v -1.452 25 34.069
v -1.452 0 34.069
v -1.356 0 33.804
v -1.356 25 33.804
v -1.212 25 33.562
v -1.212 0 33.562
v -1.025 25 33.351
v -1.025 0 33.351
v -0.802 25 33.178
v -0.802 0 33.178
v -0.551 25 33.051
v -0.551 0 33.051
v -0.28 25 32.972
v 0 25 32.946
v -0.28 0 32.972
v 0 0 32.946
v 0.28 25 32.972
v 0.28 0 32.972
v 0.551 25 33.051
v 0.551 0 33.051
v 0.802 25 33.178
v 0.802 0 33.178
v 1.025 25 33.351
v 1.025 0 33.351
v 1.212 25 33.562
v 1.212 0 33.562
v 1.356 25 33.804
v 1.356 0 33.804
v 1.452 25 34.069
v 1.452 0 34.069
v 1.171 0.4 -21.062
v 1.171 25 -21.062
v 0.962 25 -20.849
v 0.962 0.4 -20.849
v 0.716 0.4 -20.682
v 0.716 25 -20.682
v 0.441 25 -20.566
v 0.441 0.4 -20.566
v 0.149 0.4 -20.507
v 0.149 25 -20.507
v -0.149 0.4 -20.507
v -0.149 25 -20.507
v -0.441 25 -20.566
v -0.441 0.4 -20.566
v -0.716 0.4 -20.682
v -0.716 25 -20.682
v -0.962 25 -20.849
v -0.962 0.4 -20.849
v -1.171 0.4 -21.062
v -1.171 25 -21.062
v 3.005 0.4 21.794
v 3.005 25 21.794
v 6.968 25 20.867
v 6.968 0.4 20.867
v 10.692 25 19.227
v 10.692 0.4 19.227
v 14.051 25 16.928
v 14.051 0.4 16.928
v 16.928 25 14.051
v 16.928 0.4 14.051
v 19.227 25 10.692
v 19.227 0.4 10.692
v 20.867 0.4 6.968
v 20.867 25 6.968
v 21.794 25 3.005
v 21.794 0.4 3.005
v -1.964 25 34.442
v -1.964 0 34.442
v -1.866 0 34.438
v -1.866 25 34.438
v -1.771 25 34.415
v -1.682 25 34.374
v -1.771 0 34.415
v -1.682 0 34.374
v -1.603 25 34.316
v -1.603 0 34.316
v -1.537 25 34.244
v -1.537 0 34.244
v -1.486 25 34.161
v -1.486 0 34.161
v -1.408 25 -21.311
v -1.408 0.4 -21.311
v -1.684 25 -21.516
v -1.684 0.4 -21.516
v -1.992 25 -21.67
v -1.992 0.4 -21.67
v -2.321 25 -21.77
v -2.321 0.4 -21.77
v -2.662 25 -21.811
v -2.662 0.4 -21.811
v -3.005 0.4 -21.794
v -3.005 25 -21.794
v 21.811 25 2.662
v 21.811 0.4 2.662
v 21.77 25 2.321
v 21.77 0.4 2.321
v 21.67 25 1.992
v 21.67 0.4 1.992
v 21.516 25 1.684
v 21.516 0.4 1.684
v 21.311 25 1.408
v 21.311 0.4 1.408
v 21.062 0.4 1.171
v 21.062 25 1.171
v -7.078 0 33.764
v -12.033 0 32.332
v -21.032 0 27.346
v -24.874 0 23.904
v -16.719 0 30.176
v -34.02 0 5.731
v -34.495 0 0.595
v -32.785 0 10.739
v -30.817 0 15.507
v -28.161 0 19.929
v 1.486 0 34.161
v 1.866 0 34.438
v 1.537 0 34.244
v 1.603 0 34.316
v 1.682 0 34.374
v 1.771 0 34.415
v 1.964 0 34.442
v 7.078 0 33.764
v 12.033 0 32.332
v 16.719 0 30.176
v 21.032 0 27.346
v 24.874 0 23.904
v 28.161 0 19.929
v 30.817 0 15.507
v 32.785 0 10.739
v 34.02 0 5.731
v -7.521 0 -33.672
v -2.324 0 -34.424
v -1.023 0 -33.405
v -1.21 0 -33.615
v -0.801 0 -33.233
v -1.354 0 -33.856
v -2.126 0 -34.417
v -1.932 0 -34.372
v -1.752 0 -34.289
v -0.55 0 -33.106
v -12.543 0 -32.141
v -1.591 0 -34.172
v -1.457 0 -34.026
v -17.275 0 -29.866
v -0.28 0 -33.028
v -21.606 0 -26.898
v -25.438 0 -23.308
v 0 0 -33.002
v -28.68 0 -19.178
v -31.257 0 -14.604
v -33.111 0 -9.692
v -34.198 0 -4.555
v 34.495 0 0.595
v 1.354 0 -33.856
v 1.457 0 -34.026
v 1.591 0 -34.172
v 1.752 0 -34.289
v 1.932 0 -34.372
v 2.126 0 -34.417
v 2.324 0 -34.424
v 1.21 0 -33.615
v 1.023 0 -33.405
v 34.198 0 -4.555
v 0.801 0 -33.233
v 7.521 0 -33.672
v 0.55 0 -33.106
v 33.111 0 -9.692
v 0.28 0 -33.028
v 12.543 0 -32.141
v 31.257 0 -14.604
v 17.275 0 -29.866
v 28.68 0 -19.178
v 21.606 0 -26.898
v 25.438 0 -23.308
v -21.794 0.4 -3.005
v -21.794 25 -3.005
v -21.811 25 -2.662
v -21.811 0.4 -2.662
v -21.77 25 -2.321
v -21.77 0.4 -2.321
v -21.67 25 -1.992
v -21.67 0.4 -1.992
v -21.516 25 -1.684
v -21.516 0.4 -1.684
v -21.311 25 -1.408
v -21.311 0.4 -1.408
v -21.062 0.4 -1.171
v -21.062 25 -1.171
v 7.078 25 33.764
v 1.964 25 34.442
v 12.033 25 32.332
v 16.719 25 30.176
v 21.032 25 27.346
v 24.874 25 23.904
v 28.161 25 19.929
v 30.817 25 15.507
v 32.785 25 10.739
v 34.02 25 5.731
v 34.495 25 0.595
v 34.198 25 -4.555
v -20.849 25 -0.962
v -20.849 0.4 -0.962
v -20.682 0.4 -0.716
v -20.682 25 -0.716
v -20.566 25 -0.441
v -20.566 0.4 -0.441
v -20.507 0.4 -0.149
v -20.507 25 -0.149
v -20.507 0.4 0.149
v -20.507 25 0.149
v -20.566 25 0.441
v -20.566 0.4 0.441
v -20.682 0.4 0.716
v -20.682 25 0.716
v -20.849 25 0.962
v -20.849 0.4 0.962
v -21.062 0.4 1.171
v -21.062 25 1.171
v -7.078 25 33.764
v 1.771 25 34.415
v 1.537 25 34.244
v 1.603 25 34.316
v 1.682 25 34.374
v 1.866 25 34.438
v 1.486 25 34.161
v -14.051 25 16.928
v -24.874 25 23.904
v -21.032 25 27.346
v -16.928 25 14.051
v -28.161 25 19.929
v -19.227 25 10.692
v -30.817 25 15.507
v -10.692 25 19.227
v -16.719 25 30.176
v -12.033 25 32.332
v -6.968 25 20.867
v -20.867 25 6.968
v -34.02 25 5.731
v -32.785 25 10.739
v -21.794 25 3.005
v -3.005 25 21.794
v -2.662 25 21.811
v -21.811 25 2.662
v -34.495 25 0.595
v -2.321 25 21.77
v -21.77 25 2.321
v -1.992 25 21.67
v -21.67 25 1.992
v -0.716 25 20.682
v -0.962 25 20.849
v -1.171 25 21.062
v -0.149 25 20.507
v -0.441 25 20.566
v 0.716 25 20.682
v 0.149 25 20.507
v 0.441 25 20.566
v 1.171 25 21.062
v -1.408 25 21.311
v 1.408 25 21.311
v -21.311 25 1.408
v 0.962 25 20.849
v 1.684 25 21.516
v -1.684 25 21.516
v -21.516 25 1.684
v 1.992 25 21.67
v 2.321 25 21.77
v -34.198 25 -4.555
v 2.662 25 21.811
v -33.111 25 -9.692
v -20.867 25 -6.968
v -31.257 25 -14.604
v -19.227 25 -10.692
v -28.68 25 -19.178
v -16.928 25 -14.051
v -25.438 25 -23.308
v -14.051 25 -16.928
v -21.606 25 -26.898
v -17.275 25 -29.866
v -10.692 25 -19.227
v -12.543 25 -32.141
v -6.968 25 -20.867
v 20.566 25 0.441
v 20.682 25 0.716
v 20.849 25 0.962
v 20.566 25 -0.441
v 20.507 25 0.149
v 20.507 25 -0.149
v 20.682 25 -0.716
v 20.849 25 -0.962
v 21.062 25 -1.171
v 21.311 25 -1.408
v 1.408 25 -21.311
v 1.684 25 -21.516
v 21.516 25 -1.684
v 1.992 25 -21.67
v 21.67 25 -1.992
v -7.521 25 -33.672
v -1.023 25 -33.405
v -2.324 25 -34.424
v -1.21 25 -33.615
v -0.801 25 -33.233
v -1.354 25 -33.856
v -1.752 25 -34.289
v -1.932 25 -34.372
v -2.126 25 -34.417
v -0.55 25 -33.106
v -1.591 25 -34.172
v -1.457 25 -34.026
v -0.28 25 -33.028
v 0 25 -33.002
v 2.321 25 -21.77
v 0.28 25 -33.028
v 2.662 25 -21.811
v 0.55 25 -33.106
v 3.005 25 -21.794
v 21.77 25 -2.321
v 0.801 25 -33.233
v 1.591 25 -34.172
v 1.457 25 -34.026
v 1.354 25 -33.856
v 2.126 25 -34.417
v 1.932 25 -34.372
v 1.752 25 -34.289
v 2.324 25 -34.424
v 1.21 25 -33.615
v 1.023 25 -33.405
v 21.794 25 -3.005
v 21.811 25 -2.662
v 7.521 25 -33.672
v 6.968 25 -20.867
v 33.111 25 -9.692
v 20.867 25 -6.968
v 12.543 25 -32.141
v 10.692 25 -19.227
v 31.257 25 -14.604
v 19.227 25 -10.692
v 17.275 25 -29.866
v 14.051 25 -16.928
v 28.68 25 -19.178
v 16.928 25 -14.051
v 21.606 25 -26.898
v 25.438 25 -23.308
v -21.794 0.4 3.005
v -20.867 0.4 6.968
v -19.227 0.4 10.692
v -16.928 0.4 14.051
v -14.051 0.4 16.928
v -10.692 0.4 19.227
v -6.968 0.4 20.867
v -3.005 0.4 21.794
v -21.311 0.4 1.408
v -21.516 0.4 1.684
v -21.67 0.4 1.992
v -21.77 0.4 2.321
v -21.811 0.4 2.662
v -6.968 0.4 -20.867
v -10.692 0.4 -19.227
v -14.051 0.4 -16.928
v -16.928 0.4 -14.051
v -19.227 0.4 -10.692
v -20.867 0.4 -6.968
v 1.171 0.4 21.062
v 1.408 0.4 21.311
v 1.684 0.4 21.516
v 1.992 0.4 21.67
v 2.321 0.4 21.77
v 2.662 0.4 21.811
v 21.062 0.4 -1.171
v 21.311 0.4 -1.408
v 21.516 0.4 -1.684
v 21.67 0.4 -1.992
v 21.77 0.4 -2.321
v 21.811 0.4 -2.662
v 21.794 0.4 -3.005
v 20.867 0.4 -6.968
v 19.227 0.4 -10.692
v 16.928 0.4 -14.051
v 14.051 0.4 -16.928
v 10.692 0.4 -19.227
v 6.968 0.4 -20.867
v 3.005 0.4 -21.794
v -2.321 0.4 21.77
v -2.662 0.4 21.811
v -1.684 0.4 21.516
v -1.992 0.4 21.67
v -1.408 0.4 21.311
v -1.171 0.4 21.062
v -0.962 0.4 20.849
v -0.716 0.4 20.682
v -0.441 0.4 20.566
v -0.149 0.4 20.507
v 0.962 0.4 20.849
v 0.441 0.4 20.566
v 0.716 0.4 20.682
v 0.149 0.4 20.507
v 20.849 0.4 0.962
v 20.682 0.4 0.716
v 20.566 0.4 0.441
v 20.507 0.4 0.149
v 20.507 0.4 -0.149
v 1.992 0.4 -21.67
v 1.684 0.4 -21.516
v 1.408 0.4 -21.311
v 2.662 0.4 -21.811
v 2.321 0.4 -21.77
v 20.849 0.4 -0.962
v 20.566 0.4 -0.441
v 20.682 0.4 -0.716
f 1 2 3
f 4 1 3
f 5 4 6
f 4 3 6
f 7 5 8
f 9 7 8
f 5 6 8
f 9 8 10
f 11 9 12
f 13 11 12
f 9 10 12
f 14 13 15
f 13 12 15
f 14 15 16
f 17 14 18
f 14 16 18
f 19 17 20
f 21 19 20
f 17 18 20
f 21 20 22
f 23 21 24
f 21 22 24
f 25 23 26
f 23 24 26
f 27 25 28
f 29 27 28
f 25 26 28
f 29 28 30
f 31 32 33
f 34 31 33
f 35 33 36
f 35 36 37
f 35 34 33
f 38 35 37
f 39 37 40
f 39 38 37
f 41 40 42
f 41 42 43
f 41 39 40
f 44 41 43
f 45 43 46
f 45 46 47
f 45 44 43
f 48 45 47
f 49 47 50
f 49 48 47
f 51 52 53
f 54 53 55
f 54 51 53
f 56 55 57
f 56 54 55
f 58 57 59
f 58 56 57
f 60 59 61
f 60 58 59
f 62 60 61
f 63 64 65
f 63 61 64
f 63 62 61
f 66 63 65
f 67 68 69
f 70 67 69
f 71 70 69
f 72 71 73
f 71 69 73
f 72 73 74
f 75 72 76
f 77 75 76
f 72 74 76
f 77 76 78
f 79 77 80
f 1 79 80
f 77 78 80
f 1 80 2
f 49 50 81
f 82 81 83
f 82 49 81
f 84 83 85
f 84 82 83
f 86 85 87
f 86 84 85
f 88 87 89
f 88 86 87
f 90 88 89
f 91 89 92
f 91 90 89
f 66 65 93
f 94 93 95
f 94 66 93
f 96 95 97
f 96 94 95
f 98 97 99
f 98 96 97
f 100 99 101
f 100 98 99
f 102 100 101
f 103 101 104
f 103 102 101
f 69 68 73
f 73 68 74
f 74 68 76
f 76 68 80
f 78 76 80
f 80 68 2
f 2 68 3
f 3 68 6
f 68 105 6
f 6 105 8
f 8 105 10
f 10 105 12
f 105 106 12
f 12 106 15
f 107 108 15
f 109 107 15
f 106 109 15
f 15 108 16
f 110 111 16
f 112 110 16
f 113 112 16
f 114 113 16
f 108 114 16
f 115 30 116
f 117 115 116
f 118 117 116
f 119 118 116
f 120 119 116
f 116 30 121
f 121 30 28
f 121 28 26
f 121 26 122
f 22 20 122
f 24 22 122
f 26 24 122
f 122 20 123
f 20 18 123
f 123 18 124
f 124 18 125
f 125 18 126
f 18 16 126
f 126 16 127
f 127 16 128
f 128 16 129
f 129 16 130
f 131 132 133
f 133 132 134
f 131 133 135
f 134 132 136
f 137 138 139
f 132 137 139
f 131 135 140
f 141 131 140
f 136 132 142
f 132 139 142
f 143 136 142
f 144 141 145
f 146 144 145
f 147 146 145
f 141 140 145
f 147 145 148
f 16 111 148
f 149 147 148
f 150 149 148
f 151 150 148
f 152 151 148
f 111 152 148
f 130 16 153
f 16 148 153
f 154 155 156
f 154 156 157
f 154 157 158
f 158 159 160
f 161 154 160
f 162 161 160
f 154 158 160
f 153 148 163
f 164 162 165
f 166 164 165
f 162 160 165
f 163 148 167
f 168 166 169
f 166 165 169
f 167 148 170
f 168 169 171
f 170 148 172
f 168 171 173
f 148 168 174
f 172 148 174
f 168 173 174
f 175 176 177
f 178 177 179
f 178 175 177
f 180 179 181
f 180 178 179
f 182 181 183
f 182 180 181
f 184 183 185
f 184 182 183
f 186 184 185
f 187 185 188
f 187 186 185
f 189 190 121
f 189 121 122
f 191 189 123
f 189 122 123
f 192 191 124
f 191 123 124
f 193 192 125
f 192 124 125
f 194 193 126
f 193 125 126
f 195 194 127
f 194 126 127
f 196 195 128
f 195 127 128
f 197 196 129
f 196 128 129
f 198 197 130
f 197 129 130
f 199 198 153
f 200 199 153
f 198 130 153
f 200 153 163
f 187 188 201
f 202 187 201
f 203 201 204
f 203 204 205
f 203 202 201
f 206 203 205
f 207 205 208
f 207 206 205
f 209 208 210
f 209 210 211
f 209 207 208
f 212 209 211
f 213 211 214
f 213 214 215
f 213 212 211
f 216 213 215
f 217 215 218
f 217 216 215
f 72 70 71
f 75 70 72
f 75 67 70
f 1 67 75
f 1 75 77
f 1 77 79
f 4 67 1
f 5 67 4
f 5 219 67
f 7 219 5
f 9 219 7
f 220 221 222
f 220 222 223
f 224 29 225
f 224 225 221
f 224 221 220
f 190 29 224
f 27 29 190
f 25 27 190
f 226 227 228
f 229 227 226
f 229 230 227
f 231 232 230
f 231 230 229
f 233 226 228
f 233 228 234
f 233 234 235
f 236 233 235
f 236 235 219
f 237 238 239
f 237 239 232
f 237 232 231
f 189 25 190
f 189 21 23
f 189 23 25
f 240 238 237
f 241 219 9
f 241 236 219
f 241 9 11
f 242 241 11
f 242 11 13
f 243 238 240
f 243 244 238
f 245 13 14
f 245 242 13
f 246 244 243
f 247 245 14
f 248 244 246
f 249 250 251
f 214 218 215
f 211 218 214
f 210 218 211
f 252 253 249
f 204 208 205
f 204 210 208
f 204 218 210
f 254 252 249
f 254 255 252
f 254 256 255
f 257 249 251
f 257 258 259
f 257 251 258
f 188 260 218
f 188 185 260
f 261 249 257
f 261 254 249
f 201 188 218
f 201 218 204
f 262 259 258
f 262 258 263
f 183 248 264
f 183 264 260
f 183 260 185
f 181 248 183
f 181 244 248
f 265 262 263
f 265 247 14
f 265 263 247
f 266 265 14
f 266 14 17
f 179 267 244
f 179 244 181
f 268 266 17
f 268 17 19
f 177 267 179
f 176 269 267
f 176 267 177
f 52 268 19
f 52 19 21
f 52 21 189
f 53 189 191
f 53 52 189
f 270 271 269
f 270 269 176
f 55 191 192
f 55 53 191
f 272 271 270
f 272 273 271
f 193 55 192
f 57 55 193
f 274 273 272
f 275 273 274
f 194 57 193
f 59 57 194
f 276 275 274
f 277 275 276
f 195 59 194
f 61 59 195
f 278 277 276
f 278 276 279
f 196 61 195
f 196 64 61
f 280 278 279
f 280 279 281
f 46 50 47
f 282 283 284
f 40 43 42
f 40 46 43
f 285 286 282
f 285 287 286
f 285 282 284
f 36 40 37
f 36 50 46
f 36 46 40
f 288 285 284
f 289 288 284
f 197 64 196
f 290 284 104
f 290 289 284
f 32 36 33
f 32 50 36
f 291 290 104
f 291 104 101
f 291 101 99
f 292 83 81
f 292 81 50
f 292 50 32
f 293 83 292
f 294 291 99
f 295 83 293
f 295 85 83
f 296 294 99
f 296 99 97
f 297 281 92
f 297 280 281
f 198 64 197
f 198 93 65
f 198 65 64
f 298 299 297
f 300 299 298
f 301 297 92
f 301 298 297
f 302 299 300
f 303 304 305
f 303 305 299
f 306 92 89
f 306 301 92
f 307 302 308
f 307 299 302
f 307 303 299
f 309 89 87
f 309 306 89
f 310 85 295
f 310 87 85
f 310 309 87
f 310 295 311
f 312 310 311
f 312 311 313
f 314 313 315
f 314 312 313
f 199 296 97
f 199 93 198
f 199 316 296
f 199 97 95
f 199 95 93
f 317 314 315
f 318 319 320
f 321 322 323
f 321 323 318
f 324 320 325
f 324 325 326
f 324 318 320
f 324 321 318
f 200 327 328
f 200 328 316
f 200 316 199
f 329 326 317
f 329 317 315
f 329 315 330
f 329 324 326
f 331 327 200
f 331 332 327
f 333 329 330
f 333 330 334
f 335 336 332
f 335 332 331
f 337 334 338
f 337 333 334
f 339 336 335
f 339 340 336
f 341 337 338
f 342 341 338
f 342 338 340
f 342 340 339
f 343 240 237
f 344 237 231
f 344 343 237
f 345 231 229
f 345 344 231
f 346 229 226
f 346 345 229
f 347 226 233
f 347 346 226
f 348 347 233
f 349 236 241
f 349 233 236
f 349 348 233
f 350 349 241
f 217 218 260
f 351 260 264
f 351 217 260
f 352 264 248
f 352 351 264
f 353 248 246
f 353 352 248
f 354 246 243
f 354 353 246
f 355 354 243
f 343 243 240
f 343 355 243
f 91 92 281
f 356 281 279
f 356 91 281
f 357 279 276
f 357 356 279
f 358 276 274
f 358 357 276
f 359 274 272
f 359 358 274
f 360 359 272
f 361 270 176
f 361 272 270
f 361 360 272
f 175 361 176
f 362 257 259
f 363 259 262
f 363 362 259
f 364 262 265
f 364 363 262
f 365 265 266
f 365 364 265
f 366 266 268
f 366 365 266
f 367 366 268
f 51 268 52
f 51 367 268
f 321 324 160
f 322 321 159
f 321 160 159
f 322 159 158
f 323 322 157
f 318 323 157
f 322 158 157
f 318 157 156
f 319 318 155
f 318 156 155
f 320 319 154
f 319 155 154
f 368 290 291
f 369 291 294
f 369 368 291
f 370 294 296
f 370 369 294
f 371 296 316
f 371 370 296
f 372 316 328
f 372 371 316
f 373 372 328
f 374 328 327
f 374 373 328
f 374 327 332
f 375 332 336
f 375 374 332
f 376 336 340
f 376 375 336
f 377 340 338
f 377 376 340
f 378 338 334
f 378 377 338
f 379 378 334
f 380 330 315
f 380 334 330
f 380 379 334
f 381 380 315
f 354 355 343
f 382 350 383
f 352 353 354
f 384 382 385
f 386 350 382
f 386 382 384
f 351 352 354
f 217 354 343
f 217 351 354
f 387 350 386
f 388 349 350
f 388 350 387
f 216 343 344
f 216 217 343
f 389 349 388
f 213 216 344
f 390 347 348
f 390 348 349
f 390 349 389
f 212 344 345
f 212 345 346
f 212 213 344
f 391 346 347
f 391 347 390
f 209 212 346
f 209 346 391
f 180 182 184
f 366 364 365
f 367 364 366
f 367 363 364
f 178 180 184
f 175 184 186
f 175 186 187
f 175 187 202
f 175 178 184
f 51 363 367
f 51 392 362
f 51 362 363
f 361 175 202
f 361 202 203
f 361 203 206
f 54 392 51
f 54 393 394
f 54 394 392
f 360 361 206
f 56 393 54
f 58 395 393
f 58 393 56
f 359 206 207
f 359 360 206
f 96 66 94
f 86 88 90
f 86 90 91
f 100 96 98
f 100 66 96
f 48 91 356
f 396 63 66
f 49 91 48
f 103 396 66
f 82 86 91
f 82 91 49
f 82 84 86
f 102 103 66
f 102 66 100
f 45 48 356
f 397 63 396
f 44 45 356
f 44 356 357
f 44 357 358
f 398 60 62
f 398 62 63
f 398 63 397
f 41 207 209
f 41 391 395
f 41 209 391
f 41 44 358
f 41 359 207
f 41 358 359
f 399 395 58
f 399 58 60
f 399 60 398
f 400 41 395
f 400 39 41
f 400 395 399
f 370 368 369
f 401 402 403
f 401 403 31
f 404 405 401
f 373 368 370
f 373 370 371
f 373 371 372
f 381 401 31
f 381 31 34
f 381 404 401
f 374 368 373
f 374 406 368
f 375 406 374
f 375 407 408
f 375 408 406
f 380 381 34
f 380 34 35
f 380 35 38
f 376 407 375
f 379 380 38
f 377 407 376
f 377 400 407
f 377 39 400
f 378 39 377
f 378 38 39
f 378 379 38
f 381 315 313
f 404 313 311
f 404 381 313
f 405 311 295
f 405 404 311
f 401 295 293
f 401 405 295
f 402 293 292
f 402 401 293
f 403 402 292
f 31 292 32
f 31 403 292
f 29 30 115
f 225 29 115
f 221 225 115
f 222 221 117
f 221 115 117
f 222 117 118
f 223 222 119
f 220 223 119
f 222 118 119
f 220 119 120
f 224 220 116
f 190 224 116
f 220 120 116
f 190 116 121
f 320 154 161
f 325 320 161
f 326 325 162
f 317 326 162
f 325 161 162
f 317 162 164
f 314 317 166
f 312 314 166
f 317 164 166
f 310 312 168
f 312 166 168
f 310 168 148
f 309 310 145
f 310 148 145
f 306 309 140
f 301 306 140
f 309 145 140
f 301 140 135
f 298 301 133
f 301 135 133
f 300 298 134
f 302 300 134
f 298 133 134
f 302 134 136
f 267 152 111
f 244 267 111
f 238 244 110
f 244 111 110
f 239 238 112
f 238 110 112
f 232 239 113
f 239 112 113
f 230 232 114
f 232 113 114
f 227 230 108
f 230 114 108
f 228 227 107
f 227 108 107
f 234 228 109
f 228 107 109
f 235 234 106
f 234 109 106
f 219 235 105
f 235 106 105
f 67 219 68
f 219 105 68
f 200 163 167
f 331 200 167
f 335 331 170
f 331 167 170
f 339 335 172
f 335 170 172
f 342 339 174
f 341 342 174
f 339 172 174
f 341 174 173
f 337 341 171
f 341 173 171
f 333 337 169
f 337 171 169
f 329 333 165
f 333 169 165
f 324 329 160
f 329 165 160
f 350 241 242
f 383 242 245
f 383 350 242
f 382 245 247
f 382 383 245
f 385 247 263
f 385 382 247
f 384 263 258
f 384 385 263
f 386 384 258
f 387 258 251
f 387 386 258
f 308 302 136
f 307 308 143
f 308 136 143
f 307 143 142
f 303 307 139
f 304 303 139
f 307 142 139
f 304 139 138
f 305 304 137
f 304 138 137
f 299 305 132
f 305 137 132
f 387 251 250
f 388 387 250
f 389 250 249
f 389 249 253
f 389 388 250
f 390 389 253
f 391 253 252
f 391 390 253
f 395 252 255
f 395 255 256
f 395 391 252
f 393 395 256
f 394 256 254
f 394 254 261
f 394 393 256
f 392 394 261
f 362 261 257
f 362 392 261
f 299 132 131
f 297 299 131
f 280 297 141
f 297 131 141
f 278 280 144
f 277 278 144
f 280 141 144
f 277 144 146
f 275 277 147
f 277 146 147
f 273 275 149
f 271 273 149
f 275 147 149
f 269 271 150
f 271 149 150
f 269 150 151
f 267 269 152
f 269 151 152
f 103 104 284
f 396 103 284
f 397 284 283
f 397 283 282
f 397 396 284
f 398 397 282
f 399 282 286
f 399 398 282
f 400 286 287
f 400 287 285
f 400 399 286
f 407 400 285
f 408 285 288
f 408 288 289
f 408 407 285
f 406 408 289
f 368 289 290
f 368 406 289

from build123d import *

# Parameters (mm, degrees)
BOSS_EXTRUDE1_DEPTH = 25
CUT_EXTRUDE2_DEPTH  = 26
BOSS_EXTRUDE2_DEPTH = 0.4


with BuildPart() as part:
    # Sketch1 → Boss-Extrude1 (new body)
    with BuildSketch(Plane(origin=(0, 0, 0), x_dir=(1, 0, 0), z_dir=(0, 1, 0))):
        with BuildLine():
            ThreePointArc((1.451818925, -34.068556857), (1.641248992, -34.346908706), (1.964225605, -34.442038138))
            ThreePointArc((1.964225605, -34.442038138), (26.591847487, -21.978073076), (34.198225299, 4.555174015))
            ThreePointArc((34.198225299, 4.555174015), (23.590291339, 25.176355888), (2.324135821, 34.423627607))
            ThreePointArc((2.324135821, 34.423627607), (1.751838249, 34.289058819), (1.354061739, 33.856153382))
            ThreePointArc((1.354061739, 33.856153382), (0, 33.001534515), (-1.354061739, 33.856153382))
            ThreePointArc((-1.354061739, 33.856153382), (-1.751838249, 34.289058819), (-2.324135821, 34.423627607))
            ThreePointArc((-2.324135821, 34.423627607), (-23.590291339, 25.176355888), (-34.198225299, 4.555174015))
            ThreePointArc((-34.198225299, 4.555174015), (-26.591847487, -21.978073076), (-1.964225605, -34.442038138))
            ThreePointArc((-1.964225605, -34.442038138), (-1.641248992, -34.346908706), (-1.451818925, -34.068556857))
            ThreePointArc((-1.451818925, -34.068556857), (0, -32.945679925), (1.451818925, -34.068556857))
        make_face()
        with BuildLine():
            Line((-2.417, 3.787737139), (0, 3.787737139))
            Line((0, 3.787737139), (2.417, 3.787737139))
            ThreePointArc((2.417, 3.787737139), (0, -4.489512172), (-2.417, 3.787737139))
        make_face(mode=Mode.SUBTRACT)
    extrude(amount=BOSS_EXTRUDE1_DEPTH)

    # Sketch2 → Cut-Extrude2 (cut, through all)
    with BuildSketch(Plane(origin=(0, 0, 0), x_dir=(1, 0, 0), z_dir=(0, 1, 0))):
        with BuildLine():
            ThreePointArc((-21.79375, -3.005405287), (-15.556349186, -15.556349186), (-3.005405287, -21.79375))
            ThreePointArc((-3.005405287, -21.79375), (-1.991620962, -21.670338125), (-1.170937125, -21.0625))
            ThreePointArc((-1.170937125, -21.0625), (0, -20.5), (1.170937125, -21.0625))
            ThreePointArc((1.170937125, -21.0625), (1.991620962, -21.670338125), (3.005405287, -21.79375))
            ThreePointArc((3.005405287, -21.79375), (15.556349186, -15.556349186), (21.79375, -3.005405287))
            ThreePointArc((21.79375, -3.005405287), (21.670338125, -1.991620962), (21.0625, -1.170937125))
            ThreePointArc((21.0625, -1.170937125), (20.5, 0), (21.0625, 1.170937125))
            ThreePointArc((21.0625, 1.170937125), (21.670338125, 1.991620962), (21.79375, 3.005405287))
            ThreePointArc((21.79375, 3.005405287), (15.556349186, 15.556349186), (3.005405287, 21.79375))
            ThreePointArc((3.005405287, 21.79375), (1.991620962, 21.670338125), (1.170937125, 21.0625))
            ThreePointArc((1.170937125, 21.0625), (0, 20.5), (-1.170937125, 21.0625))
            ThreePointArc((-1.170937125, 21.0625), (-1.991620962, 21.670338125), (-3.005405287, 21.79375))
            ThreePointArc((-3.005405287, 21.79375), (-15.556349186, 15.556349186), (-21.79375, 3.005405287))
            ThreePointArc((-21.79375, 3.005405287), (-21.670338125, 1.991620962), (-21.0625, 1.170937125))
            ThreePointArc((-21.0625, 1.170937125), (-20.5, 0), (-21.0625, -1.170937125))
            ThreePointArc((-21.0625, -1.170937125), (-21.670338125, -1.991620962), (-21.79375, -3.005405287))
        make_face()
    extrude(amount=CUT_EXTRUDE2_DEPTH, mode=Mode.SUBTRACT)

    # Sketch2<2> → Boss-Extrude2 (add)
    with BuildSketch(Plane(origin=(0, 0, 0), x_dir=(1, 0, 0), z_dir=(0, 1, 0))):
        with BuildLine():
            ThreePointArc((-21.79375, -3.005405287), (-15.556349186, -15.556349186), (-3.005405287, -21.79375))
            ThreePointArc((-3.005405287, -21.79375), (-1.991620962, -21.670338125), (-1.170937125, -21.0625))
            ThreePointArc((-1.170937125, -21.0625), (0, -20.5), (1.170937125, -21.0625))
            ThreePointArc((1.170937125, -21.0625), (1.991620962, -21.670338125), (3.005405287, -21.79375))
            ThreePointArc((3.005405287, -21.79375), (15.556349186, -15.556349186), (21.79375, -3.005405287))
            ThreePointArc((21.79375, -3.005405287), (21.670338125, -1.991620962), (21.0625, -1.170937125))
            ThreePointArc((21.0625, -1.170937125), (20.5, 0), (21.0625, 1.170937125))
            ThreePointArc((21.0625, 1.170937125), (21.670338125, 1.991620962), (21.79375, 3.005405287))
            ThreePointArc((21.79375, 3.005405287), (15.556349186, 15.556349186), (3.005405287, 21.79375))
            ThreePointArc((3.005405287, 21.79375), (1.991620962, 21.670338125), (1.170937125, 21.0625))
            ThreePointArc((1.170937125, 21.0625), (0, 20.5), (-1.170937125, 21.0625))
            ThreePointArc((-1.170937125, 21.0625), (-1.991620962, 21.670338125), (-3.005405287, 21.79375))
            ThreePointArc((-3.005405287, 21.79375), (-15.556349186, 15.556349186), (-21.79375, 3.005405287))
            ThreePointArc((-21.79375, 3.005405287), (-21.670338125, 1.991620962), (-21.0625, 1.170937125))
            ThreePointArc((-21.0625, 1.170937125), (-20.5, 0), (-21.0625, -1.170937125))
            ThreePointArc((-21.0625, -1.170937125), (-21.670338125, -1.991620962), (-21.79375, -3.005405287))
        make_face()
    extrude(amount=BOSS_EXTRUDE2_DEPTH)


solid = part.part
